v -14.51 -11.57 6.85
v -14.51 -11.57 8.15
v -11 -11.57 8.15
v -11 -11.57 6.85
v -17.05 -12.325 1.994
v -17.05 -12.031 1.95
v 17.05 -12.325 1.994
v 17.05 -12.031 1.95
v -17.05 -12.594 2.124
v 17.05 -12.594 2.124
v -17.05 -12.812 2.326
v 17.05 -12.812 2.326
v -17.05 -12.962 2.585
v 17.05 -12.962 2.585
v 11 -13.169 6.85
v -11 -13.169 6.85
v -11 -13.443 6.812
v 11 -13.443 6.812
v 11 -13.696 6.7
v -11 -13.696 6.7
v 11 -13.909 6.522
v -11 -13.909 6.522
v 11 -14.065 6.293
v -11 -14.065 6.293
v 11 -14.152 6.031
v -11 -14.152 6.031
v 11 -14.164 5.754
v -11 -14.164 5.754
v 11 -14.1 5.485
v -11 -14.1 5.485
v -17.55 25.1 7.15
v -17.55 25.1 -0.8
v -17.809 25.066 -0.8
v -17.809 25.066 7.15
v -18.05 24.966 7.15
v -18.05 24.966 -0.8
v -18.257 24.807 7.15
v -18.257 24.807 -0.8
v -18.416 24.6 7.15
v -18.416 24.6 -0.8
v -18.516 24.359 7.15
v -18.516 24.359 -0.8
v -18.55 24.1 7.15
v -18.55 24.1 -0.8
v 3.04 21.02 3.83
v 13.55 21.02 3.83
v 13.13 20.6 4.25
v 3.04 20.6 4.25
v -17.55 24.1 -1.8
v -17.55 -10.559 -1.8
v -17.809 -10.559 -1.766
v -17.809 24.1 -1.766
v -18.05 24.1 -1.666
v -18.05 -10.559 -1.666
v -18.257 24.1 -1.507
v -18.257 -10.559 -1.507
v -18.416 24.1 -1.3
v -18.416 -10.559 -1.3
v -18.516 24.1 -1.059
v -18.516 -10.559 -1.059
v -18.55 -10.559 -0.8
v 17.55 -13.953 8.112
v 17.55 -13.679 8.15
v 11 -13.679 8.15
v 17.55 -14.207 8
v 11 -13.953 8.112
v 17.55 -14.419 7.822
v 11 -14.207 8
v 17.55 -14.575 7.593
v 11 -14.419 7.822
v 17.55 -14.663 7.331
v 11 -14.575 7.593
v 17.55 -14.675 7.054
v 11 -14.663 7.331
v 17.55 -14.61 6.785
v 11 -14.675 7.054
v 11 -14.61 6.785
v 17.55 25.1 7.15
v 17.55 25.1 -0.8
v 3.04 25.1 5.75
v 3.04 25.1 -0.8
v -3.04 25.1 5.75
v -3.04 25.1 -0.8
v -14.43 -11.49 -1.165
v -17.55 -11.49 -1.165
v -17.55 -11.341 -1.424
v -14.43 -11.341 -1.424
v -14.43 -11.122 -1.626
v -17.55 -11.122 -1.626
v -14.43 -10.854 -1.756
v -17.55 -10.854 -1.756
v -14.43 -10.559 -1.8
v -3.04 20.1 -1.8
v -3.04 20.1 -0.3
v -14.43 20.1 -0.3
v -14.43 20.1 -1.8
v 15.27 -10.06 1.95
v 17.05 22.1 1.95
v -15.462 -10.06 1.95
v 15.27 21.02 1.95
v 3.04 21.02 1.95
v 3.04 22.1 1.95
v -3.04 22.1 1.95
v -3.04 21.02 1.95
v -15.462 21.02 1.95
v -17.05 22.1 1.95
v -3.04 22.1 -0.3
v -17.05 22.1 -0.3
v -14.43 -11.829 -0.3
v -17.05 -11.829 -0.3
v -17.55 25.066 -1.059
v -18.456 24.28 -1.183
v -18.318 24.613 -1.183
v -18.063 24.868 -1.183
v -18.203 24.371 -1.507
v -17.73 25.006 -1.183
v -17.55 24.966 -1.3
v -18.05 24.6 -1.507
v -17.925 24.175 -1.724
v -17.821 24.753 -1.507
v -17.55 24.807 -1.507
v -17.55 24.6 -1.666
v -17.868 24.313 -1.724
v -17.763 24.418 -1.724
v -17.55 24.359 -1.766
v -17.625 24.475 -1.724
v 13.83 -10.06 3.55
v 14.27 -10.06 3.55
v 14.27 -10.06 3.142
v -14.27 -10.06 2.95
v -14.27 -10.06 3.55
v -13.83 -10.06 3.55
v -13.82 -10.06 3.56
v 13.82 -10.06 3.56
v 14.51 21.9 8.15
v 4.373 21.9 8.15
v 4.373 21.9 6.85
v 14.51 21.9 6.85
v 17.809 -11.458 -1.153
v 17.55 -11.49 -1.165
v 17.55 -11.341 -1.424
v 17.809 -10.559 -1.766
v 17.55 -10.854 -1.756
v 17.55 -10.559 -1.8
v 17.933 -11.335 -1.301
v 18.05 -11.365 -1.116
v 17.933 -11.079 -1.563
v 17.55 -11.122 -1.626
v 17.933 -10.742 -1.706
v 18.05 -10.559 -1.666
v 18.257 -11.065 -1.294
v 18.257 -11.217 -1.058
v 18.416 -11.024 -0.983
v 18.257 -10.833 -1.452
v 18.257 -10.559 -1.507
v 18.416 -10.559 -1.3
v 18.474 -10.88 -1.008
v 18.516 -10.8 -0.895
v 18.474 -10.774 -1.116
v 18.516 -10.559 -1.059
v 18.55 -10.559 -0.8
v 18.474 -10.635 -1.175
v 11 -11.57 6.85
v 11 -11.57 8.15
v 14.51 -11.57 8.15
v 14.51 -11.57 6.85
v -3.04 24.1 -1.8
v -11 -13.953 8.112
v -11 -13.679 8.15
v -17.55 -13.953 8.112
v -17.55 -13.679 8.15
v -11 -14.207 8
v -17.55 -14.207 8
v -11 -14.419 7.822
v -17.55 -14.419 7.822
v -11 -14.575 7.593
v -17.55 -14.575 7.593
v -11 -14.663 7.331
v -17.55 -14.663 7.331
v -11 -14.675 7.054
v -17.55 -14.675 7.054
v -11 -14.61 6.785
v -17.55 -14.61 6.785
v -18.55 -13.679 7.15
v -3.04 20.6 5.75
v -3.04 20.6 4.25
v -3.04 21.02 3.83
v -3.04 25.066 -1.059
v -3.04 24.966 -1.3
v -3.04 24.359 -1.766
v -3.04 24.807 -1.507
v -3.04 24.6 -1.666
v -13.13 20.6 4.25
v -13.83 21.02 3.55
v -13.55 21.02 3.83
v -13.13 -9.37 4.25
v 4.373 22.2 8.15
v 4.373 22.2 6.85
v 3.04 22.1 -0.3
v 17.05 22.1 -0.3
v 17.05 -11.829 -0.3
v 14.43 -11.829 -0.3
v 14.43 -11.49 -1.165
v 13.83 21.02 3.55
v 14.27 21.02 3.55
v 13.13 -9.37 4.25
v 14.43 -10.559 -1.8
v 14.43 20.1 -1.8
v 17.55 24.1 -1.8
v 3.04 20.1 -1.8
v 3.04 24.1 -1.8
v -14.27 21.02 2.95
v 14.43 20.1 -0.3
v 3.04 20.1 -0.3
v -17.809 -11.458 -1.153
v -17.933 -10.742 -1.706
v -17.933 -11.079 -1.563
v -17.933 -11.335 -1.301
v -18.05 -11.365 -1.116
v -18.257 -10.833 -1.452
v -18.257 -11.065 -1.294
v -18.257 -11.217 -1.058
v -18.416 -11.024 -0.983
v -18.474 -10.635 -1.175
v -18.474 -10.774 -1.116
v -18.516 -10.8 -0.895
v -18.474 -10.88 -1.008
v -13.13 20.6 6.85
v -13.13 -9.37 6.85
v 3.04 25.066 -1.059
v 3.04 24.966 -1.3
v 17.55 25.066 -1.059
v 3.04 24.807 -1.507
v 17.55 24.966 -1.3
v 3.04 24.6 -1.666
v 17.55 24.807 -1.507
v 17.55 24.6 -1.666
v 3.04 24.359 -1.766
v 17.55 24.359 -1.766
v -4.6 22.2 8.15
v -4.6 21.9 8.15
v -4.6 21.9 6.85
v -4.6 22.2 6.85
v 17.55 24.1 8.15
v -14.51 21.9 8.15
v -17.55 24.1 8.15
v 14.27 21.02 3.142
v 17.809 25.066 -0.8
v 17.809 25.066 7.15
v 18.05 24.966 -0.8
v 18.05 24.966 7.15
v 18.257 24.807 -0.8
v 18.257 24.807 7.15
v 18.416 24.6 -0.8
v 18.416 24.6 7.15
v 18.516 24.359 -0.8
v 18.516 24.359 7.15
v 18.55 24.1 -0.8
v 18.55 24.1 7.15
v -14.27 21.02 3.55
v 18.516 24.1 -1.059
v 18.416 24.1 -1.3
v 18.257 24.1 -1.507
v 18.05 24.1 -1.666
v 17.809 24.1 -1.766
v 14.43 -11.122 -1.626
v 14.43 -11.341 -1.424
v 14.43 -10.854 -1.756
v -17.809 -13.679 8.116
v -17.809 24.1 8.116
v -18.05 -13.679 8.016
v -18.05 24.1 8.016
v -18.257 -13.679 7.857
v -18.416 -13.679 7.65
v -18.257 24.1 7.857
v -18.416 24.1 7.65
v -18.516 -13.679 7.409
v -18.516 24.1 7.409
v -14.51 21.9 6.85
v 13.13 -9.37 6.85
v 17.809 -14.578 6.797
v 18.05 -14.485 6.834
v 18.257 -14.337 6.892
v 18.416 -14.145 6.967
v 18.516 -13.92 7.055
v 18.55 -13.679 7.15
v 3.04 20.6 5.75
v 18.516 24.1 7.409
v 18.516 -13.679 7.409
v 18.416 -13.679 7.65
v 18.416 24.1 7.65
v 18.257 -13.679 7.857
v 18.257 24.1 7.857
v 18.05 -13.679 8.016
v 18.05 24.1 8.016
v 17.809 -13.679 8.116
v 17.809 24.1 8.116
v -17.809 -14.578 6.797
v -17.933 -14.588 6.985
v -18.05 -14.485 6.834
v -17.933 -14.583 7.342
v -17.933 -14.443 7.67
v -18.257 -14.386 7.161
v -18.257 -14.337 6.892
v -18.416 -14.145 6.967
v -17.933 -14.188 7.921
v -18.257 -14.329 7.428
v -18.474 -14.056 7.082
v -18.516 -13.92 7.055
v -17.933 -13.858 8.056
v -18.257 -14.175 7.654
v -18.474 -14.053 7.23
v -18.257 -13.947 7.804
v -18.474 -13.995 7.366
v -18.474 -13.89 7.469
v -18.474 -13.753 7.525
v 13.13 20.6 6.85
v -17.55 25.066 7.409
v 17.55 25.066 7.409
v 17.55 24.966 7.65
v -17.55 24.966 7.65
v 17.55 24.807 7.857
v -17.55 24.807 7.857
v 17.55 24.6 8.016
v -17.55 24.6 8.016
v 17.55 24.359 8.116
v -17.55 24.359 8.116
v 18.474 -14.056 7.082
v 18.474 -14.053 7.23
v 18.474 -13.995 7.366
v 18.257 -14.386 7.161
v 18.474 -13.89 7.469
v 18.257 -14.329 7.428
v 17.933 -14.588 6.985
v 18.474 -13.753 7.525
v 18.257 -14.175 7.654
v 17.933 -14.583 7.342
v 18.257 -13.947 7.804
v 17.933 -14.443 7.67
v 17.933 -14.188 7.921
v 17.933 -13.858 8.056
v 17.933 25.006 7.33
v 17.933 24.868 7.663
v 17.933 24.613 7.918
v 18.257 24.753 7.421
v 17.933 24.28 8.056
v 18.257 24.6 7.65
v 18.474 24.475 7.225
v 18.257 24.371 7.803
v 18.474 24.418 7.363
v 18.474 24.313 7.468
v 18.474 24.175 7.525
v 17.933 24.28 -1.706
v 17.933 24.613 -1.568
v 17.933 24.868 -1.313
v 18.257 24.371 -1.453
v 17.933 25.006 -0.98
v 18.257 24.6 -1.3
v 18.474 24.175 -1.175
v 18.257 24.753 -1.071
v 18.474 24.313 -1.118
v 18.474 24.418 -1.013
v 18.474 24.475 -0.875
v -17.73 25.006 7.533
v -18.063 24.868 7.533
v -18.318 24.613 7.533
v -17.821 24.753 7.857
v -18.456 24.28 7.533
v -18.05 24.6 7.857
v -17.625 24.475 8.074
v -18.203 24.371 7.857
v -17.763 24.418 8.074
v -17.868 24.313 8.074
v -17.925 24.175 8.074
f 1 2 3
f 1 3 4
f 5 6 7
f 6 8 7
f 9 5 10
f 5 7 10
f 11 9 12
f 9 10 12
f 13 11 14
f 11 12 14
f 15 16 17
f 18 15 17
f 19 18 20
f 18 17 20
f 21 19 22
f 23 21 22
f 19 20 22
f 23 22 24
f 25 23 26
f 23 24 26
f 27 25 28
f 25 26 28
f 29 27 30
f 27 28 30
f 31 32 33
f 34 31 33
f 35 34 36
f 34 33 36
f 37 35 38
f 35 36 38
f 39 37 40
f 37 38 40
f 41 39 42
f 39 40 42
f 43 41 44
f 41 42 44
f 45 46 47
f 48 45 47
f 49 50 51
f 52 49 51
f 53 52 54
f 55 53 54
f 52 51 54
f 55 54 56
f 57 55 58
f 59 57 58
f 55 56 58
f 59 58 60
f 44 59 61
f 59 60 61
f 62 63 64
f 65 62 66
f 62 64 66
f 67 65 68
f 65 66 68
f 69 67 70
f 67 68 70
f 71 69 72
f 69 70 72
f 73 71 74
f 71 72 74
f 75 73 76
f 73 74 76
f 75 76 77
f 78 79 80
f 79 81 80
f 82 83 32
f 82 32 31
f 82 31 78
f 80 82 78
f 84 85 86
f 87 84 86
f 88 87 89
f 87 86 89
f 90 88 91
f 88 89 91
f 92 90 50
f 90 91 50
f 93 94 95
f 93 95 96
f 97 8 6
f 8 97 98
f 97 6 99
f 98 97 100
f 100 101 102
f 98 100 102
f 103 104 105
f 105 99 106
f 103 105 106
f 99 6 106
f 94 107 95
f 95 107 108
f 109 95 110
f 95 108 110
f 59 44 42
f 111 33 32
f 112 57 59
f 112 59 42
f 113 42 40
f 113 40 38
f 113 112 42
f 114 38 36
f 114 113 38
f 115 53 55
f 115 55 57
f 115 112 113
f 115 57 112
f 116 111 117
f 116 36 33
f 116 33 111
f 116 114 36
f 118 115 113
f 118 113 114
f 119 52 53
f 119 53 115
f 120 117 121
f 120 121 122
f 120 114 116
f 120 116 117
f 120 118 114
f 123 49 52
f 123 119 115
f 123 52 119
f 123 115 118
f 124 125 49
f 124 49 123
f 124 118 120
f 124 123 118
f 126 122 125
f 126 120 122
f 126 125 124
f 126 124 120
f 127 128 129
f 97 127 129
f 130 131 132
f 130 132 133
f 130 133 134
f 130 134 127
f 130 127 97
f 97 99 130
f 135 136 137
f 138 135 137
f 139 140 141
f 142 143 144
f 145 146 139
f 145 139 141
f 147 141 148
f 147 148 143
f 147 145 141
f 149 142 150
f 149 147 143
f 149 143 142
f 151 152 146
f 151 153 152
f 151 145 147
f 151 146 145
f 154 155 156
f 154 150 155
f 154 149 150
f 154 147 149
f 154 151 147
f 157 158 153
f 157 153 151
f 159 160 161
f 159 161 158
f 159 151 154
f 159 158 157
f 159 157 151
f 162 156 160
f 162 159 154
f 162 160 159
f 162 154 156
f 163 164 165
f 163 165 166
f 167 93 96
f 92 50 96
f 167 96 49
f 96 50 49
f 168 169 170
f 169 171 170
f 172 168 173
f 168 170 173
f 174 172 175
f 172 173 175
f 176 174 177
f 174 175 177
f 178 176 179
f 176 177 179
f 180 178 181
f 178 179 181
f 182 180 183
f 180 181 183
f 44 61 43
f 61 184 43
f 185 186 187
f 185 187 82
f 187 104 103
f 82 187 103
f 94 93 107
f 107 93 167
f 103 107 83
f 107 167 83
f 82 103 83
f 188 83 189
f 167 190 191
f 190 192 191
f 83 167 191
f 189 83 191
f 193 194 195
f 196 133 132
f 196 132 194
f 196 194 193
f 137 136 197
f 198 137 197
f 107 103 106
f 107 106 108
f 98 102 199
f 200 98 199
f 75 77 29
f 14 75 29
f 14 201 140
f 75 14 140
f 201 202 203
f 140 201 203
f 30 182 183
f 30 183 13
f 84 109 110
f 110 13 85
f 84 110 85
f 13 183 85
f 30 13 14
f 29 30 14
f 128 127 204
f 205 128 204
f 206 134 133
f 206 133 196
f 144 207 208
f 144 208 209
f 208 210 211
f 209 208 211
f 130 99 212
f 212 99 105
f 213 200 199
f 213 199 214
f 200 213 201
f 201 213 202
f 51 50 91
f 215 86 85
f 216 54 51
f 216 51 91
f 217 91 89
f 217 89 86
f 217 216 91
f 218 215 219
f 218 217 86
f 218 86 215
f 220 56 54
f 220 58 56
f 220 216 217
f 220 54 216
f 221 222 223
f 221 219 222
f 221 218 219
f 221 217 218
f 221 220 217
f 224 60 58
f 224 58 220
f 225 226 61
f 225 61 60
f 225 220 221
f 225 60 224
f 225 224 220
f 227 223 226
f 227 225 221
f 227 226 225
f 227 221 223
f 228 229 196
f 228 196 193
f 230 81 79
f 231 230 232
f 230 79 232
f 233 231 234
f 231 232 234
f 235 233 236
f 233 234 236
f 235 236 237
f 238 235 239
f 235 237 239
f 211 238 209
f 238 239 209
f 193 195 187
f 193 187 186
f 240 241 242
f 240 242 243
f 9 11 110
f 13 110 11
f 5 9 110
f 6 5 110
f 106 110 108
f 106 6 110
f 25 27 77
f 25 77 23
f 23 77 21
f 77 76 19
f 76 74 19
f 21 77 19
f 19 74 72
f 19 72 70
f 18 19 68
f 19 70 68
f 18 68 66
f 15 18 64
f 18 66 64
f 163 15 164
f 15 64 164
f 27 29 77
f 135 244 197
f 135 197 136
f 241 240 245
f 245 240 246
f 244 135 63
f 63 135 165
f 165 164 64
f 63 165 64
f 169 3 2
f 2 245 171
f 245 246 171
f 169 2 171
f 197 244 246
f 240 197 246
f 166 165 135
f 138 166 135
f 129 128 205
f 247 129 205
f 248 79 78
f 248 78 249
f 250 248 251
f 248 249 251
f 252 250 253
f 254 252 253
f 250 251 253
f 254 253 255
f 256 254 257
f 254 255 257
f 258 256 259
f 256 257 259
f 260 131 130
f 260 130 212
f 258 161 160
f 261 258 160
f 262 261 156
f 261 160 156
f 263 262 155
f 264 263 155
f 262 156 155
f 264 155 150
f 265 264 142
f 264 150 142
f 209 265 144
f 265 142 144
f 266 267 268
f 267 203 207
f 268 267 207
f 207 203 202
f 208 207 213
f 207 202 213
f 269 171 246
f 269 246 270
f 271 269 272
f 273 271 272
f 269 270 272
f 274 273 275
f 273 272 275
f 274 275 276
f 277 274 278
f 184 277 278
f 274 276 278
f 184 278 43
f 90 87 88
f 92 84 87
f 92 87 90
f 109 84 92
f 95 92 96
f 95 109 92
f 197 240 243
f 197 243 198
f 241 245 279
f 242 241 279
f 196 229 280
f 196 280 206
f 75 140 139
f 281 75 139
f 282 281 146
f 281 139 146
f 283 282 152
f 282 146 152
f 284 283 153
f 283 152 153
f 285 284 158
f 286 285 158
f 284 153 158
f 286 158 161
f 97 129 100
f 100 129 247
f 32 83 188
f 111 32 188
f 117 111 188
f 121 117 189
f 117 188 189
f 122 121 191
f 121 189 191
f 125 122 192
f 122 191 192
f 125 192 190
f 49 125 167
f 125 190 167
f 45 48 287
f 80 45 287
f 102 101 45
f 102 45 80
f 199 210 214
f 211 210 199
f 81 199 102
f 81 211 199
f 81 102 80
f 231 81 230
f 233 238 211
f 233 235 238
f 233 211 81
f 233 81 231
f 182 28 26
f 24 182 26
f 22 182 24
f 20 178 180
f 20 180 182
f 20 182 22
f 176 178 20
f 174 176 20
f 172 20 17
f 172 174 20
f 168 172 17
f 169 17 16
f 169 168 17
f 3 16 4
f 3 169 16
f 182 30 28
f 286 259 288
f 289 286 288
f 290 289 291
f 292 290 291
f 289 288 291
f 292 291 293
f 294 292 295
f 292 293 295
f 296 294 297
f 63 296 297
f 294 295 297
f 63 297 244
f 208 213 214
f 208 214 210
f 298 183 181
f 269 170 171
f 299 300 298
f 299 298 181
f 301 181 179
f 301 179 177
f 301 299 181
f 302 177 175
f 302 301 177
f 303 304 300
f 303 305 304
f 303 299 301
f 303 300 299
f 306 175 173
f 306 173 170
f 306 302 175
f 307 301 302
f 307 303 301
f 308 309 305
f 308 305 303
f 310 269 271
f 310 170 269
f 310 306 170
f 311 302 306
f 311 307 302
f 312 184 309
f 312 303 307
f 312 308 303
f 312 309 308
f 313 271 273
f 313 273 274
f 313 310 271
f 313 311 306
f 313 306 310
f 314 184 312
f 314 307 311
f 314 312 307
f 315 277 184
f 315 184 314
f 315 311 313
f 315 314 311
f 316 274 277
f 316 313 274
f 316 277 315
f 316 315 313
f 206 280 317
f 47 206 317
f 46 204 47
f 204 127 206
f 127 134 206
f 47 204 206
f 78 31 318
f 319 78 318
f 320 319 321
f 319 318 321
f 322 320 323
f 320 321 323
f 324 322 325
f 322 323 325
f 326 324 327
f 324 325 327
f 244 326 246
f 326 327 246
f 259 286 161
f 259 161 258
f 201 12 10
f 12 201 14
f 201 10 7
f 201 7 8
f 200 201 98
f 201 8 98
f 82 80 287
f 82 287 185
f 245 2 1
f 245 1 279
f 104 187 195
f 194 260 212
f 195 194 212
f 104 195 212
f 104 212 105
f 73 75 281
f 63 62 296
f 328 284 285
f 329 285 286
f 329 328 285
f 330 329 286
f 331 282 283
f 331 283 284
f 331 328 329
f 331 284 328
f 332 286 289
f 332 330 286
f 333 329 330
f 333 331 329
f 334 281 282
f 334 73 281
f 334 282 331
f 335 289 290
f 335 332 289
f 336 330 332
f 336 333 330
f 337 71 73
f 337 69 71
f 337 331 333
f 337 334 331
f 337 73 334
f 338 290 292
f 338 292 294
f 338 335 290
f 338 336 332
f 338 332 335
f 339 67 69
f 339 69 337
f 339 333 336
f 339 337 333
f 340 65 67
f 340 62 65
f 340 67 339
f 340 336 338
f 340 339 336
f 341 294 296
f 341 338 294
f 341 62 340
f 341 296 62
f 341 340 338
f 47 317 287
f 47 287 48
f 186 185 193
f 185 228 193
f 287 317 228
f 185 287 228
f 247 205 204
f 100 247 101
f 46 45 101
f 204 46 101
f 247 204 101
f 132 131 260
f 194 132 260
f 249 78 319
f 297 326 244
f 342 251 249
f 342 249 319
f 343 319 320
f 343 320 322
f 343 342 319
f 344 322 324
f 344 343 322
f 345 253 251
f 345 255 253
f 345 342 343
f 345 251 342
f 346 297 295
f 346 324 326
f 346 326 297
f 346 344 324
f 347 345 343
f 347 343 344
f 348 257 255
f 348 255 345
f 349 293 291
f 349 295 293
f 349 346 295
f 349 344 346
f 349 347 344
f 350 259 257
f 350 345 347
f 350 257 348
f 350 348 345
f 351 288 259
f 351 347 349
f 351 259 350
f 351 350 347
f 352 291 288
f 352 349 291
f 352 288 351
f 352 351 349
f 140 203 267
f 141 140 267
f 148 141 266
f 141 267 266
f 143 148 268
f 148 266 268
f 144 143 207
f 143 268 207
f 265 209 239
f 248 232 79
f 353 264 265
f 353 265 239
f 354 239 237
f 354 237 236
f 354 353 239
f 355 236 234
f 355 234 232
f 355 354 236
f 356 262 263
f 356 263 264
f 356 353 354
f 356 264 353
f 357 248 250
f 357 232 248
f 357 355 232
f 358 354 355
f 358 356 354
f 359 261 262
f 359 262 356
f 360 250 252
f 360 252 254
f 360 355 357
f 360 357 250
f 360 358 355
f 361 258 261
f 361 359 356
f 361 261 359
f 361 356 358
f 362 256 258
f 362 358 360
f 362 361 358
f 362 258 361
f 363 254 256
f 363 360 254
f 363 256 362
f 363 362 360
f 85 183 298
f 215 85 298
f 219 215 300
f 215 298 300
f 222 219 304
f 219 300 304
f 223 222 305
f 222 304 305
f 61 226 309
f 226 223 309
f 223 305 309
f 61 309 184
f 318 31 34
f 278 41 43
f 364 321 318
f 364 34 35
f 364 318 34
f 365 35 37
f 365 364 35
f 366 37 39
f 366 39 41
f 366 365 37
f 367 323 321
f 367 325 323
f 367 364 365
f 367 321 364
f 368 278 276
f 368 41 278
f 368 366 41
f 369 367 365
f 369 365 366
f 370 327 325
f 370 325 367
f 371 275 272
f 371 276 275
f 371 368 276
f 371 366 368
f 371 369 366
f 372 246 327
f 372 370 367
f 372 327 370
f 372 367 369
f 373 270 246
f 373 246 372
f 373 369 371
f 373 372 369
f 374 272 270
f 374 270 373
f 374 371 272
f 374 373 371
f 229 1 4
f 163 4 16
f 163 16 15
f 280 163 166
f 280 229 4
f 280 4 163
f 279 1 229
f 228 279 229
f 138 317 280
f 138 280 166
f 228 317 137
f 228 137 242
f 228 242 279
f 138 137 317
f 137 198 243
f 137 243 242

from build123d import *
from OCP.BRepFilletAPI import BRepFilletAPI_MakeChamfer

# Parameters (mm, degrees)
BOSS_EXTRUDE1_START    = -18.55
BOSS_EXTRUDE1_DEPTH    = 4.04
BOSS_EXTRUDE1_START_2  = -14.51
BOSS_EXTRUDE1_2_DEPTH  = 1.38
BOSS_EXTRUDE1_3_DEPTH  = 1.5
BOSS_EXTRUDE1_4_DEPTH  = 0.24
BOSS_EXTRUDE1_5_DEPTH  = 0.08
BOSS_EXTRUDE1_START_3  = 14.51
BOSS_EXTRUDE1_6_DEPTH  = 4.04
BOSS_EXTRUDE1_START_4  = 13.13
BOSS_EXTRUDE1_7_DEPTH  = 1.38
BOSS_EXTRUDE1_START_5  = 17.05
BOSS_EXTRUDE1_8_DEPTH  = 1.5
BOSS_EXTRUDE1_START_6  = 14.27
BOSS_EXTRUDE1_9_DEPTH  = 0.24
BOSS_EXTRUDE1_START_7  = 14.43
BOSS_EXTRUDE1_10_DEPTH = 0.08
BOSS_EXTRUDE2_START    = -17.05
BOSS_EXTRUDE2_DEPTH    = 34.1
FILLET1_R              = 1
SKETCH5_W              = 22
SKETCH5_H              = 3.109151444
SKETCH5_W_2            = 8.973474185
SKETCH5_H_2            = 2.258096186
CUT_EXTRUDE1_DEPTH     = 1.3
CHAMFER1_SIZE          = 0.7
FILLET2_R              = 1
SKETCH6_W              = 6.08
SKETCH6_H              = 25.074252642
CUT_EXTRUDE2_DEPTH     = 7.55
CHAMFER3_SIZE          = 1
CHAMFER3_SIZE2         = 1.191753593


with BuildPart() as part:
    # Boss-Extrude1: read off the stored shape, not the designer's step
    # Boss-Extrude1 outline → Boss-Extrude1 (new body)
    with BuildSketch(Plane.YZ.offset(BOSS_EXTRUDE1_START)):
        Polygon((-11.240546545, -1.8), (25.1, -1.8), (25.1, -0.3), (-11.829296545, -0.3), align=None)
        Polygon((-12.712421545, 1.95), (25.1, 1.95), (25.1, 8.15), (-15.145921545, 8.15), align=None)
    extrude(amount=BOSS_EXTRUDE1_DEPTH)

    # Boss-Extrude1 2 outline → Boss-Extrude1 2 (add)
    with BuildSketch(Plane.YZ.offset(BOSS_EXTRUDE1_START_2)):
        Polygon((-13.340421545, 3.55), (25.1, 3.55), (25.1, 6.85), (-14.635671545, 6.85), align=None)
    extrude(amount=BOSS_EXTRUDE1_2_DEPTH)

    # Boss-Extrude1 3 outline → Boss-Extrude1 3 (add)
    with BuildSketch(Plane.YZ.offset(BOSS_EXTRUDE1_START)):
        Polygon((-11.829296545, -0.3), (25.1, -0.3), (25.1, 1.95), (-12.712421545, 1.95), align=None)
    extrude(amount=BOSS_EXTRUDE1_3_DEPTH)

    # Boss-Extrude1 4 outline → Boss-Extrude1 4 (add)
    with BuildSketch(Plane.YZ.offset(BOSS_EXTRUDE1_START_2)):
        Polygon((-12.712421545, 1.95), (25.1, 1.95), (25.1, 3.55), (-13.340421545, 3.55), align=None)
    extrude(amount=BOSS_EXTRUDE1_4_DEPTH)

    # Boss-Extrude1 5 outline → Boss-Extrude1 5 (add)
    with BuildSketch(Plane.YZ.offset(BOSS_EXTRUDE1_START_2)):
        Polygon((-11.240546545, -1.8), (25.1, -1.8), (25.1, -0.3), (-11.829296545, -0.3), align=None)
    extrude(amount=BOSS_EXTRUDE1_5_DEPTH)



with BuildPart() as body_2:
    # Boss-Extrude1 6 outline → Boss-Extrude1 6 (new body)
    with BuildSketch(Plane.YZ.offset(BOSS_EXTRUDE1_START_3)):
        Polygon((-11.240546545, -1.8), (25.1, -1.8), (25.1, -0.3), (-11.829296545, -0.3), align=None)
        Polygon((-12.712421545, 1.95), (25.1, 1.95), (25.1, 8.15), (-15.145921545, 8.15), align=None)
    extrude(amount=BOSS_EXTRUDE1_6_DEPTH)

    # Boss-Extrude1 7 outline → Boss-Extrude1 7 (add)
    with BuildSketch(Plane.YZ.offset(BOSS_EXTRUDE1_START_4)):
        Polygon((-13.340421545, 3.55), (25.1, 3.55), (25.1, 6.85), (-14.635671545, 6.85), align=None)
    extrude(amount=BOSS_EXTRUDE1_7_DEPTH)

    # Boss-Extrude1 8 outline → Boss-Extrude1 8 (add)
    with BuildSketch(Plane.YZ.offset(BOSS_EXTRUDE1_START_5)):
        Polygon((-11.829296545, -0.3), (25.1, -0.3), (25.1, 1.95), (-12.712421545, 1.95), align=None)
    extrude(amount=BOSS_EXTRUDE1_8_DEPTH)

    # Boss-Extrude1 9 outline → Boss-Extrude1 9 (add)
    with BuildSketch(Plane.YZ.offset(BOSS_EXTRUDE1_START_6)):
        Polygon((-12.712421545, 1.95), (25.1, 1.95), (25.1, 3.55), (-13.340421545, 3.55), align=None)
    extrude(amount=BOSS_EXTRUDE1_9_DEPTH)

    # Boss-Extrude1 10 outline → Boss-Extrude1 10 (add)
    with BuildSketch(Plane.YZ.offset(BOSS_EXTRUDE1_START_7)):
        Polygon((-11.240546545, -1.8), (25.1, -1.8), (25.1, -0.3), (-11.829296545, -0.3), align=None)
    extrude(amount=BOSS_EXTRUDE1_10_DEPTH)


with BuildPart() as part_1:
    add(part.part)

    add(body_2.part)  # Boss-Extrude2 merges body 2
    # Sketch4 → Boss-Extrude2 (add)
    with BuildSketch(Plane(origin=(0, 0, 0), x_dir=(0, 0, -1), z_dir=(1, 0, 0)).offset(BOSS_EXTRUDE2_START)):
        Polygon((1.8, 25.1), (-8.15, 25.1), (-8.15, 21.9), (-6.85, 21.9), (-6.85, 20.6), (-3.55, 20.6), (-3.55, 21.02), (-1.95, 21.02), (-1.95, 22.1), (0.3, 22.1), (0.3, 20.1), (1.8, 20.1), (1.8, 22.1), align=None)
        Polygon((-3.55, -10.06), (-1.95, -10.06), (-1.95, -12.712421545), (-8.15, -15.145921545), (-8.15, -11.57), (-6.85, -11.57), (-6.85, -9.37), (-3.55, -9.37), align=None)
    extrude(amount=BOSS_EXTRUDE2_DEPTH)

    # Fillet1
    fillet1_edges = [part_1.edges().sort_by_distance(p)[0] for p in [
        (0, -12.712421545, 1.95),
        (0, -15.145921545, 8.15),
    ]]
    fillet(fillet1_edges, radius=FILLET1_R)

    # Sketch5 → Cut-Extrude1 (cut)
    with BuildSketch(Plane.XY.offset(8.15)):
        with Locations((0, -13.124575722)):
            Rectangle(SKETCH5_W, SKETCH5_H)
        with Locations((-0.113262908, 21.070951907)):
            Rectangle(SKETCH5_W_2, SKETCH5_H_2)
    extrude(amount=-CUT_EXTRUDE1_DEPTH, mode=Mode.SUBTRACT)

    # Chamfer1
    # the kernel refuses this chamfer: 0.7 mm, written as the material it takes off along each edge
    with BuildSketch(Plane(origin=(-13.13, 20.6, 3.55), x_dir=(0, 1, 0), z_dir=(1, 0, 0))) as chamfer1_piece_1_section:
        Polygon((CHAMFER1_SIZE, 0), (0, CHAMFER1_SIZE), (0, 0), align=None)
    chamfer1_piece_1 = extrude(amount=26.26, mode=Mode.PRIVATE)
    chamfer1_piece_1 = split(chamfer1_piece_1, bisect_by=Plane(origin=(-13.13, 21.02, 3.55), z_dir=(0, -1, 0)), keep=Keep.TOP, mode=Mode.PRIVATE)
    add(chamfer1_piece_1, mode=Mode.SUBTRACT)
    with BuildSketch(Plane(origin=(13.13, -9.37, 3.55), x_dir=(1, 0, 0), z_dir=(0, 1, 0))) as chamfer1_piece_2:
        Polygon((CHAMFER1_SIZE, 0), (0, -CHAMFER1_SIZE), (0, 0), align=None)
    extrude(amount=29.97, mode=Mode.SUBTRACT)
    with BuildSketch(Plane(origin=(-13.13, -9.37, 3.55), x_dir=(0, -1, 0), z_dir=(1, 0, 0))) as chamfer1_piece_3_section:
        Polygon((CHAMFER1_SIZE, 0), (0, -CHAMFER1_SIZE), (0, 0), align=None)
    chamfer1_piece_3 = extrude(amount=26.26, mode=Mode.PRIVATE)
    chamfer1_piece_3 = split(chamfer1_piece_3, bisect_by=Plane(origin=(-13.13, -10.06, 3.55), z_dir=(0, 1, 0)), keep=Keep.TOP, mode=Mode.PRIVATE)
    add(chamfer1_piece_3, mode=Mode.SUBTRACT)
    with BuildSketch(Plane(origin=(-13.13, -9.37, 3.55), x_dir=(-1, 0, 0), z_dir=(0, 1, 0))) as chamfer1_piece_4:
        Polygon((CHAMFER1_SIZE, 0), (0, CHAMFER1_SIZE), (0, 0), align=None)
    extrude(amount=29.97, mode=Mode.SUBTRACT)
    with BuildSketch(Plane(origin=(-14.930178092, 20.6, 3.55), x_dir=(0, 1, 0), z_dir=(1, 0, 0))) as chamfer1_piece_5a_section:
        Polygon((CHAMFER1_SIZE, 0), (0, CHAMFER1_SIZE), (0, 0), align=None)
    chamfer1_piece_5a = extrude(amount=28.060178092, mode=Mode.PRIVATE)
    chamfer1_piece_5a = split(chamfer1_piece_5a, bisect_by=Plane(origin=(-14.27, 20.6, 3.55), z_dir=(1, 0, 0)), keep=Keep.TOP, mode=Mode.PRIVATE)
    chamfer1_piece_5a = split(chamfer1_piece_5a, bisect_by=Plane(origin=(-14.930178092, 21.02, 3.55), z_dir=(0, -1, 0)), keep=Keep.TOP, mode=Mode.PRIVATE)
    chamfer1_piece_5a = split(chamfer1_piece_5a, bisect_by=Plane(origin=(-13.13, 20.6, 3.55), z_dir=(-1, 0, 0)), keep=Keep.TOP, mode=Mode.PRIVATE)
    with BuildSketch(Plane(origin=(-13.13, -9.37, 3.55), x_dir=(-1, 0, 0), z_dir=(0, 1, 0))) as chamfer1_piece_5b_section:
        Polygon((CHAMFER1_SIZE, 0), (0, CHAMFER1_SIZE), (0, 0), align=None)
    chamfer1_piece_5b = extrude(amount=31.770178092, mode=Mode.PRIVATE)
    chamfer1_piece_5b = split(chamfer1_piece_5b, bisect_by=Plane(origin=(-13.13, 21.02, 3.55), z_dir=(0, -1, 0)), keep=Keep.TOP, mode=Mode.PRIVATE)
    chamfer1_piece_5b = split(chamfer1_piece_5b, bisect_by=Plane(origin=(-13.13, 20.6, 3.55), z_dir=(0, 1, 0)), keep=Keep.TOP, mode=Mode.PRIVATE)
    chamfer1_piece_5 = chamfer1_piece_5a & chamfer1_piece_5b
    add(chamfer1_piece_5, mode=Mode.SUBTRACT)
    with BuildSketch(Plane(origin=(-13.13, 20.6, 3.55), x_dir=(0, 1, 0), z_dir=(1, 0, 0))) as chamfer1_piece_6a_section:
        Polygon((CHAMFER1_SIZE, 0), (0, CHAMFER1_SIZE), (0, 0), align=None)
    chamfer1_piece_6a = extrude(amount=28.060178092, mode=Mode.PRIVATE)
    chamfer1_piece_6a = split(chamfer1_piece_6a, bisect_by=Plane(origin=(-13.13, 21.02, 3.55), z_dir=(0, -1, 0)), keep=Keep.TOP, mode=Mode.PRIVATE)
    chamfer1_piece_6a = split(chamfer1_piece_6a, bisect_by=Plane(origin=(14.27, 20.6, 3.55), z_dir=(-1, 0, 0)), keep=Keep.TOP, mode=Mode.PRIVATE)
    chamfer1_piece_6a = split(chamfer1_piece_6a, bisect_by=Plane(origin=(13.13, 20.6, 3.55), z_dir=(1, 0, 0)), keep=Keep.TOP, mode=Mode.PRIVATE)
    with BuildSketch(Plane(origin=(13.13, -9.37, 3.55), x_dir=(1, 0, 0), z_dir=(0, 1, 0))) as chamfer1_piece_6b_section:
        Polygon((CHAMFER1_SIZE, 0), (0, -CHAMFER1_SIZE), (0, 0), align=None)
    chamfer1_piece_6b = extrude(amount=31.770178092, mode=Mode.PRIVATE)
    chamfer1_piece_6b = split(chamfer1_piece_6b, bisect_by=Plane(origin=(13.13, 21.02, 3.55), z_dir=(0, -1, 0)), keep=Keep.TOP, mode=Mode.PRIVATE)
    chamfer1_piece_6b = split(chamfer1_piece_6b, bisect_by=Plane(origin=(13.13, 20.6, 3.55), z_dir=(0, 1, 0)), keep=Keep.TOP, mode=Mode.PRIVATE)
    chamfer1_piece_6 = chamfer1_piece_6a & chamfer1_piece_6b
    add(chamfer1_piece_6, mode=Mode.SUBTRACT)
    with BuildSketch(Plane(origin=(13.13, -11.170178092, 3.55), x_dir=(1, 0, 0), z_dir=(0, 1, 0))) as chamfer1_piece_7a_section:
        Polygon((CHAMFER1_SIZE, 0), (0, -CHAMFER1_SIZE), (0, 0), align=None)
    chamfer1_piece_7a = extrude(amount=31.770178092, mode=Mode.PRIVATE)
    chamfer1_piece_7a = split(chamfer1_piece_7a, bisect_by=Plane(origin=(13.13, -10.06, 3.55), z_dir=(0, 1, 0)), keep=Keep.TOP, mode=Mode.PRIVATE)
    chamfer1_piece_7a = split(chamfer1_piece_7a, bisect_by=Plane(origin=(13.13, -9.37, 3.55), z_dir=(0, -1, 0)), keep=Keep.TOP, mode=Mode.PRIVATE)
    with BuildSketch(Plane(origin=(-13.13, -9.37, 3.55), x_dir=(0, -1, 0), z_dir=(1, 0, 0))) as chamfer1_piece_7b_section:
        Polygon((CHAMFER1_SIZE, 0), (0, -CHAMFER1_SIZE), (0, 0), align=None)
    chamfer1_piece_7b = extrude(amount=28.060178092, mode=Mode.PRIVATE)
    chamfer1_piece_7b = split(chamfer1_piece_7b, bisect_by=Plane(origin=(-13.13, -10.06, 3.55), z_dir=(0, 1, 0)), keep=Keep.TOP, mode=Mode.PRIVATE)
    chamfer1_piece_7b = split(chamfer1_piece_7b, bisect_by=Plane(origin=(14.27, -9.37, 3.55), z_dir=(-1, 0, 0)), keep=Keep.TOP, mode=Mode.PRIVATE)
    chamfer1_piece_7b = split(chamfer1_piece_7b, bisect_by=Plane(origin=(13.13, -9.37, 3.55), z_dir=(1, 0, 0)), keep=Keep.TOP, mode=Mode.PRIVATE)
    chamfer1_piece_7 = chamfer1_piece_7a & chamfer1_piece_7b
    add(chamfer1_piece_7, mode=Mode.SUBTRACT)
    with BuildSketch(Plane(origin=(-14.930178092, -9.37, 3.55), x_dir=(0, -1, 0), z_dir=(1, 0, 0))) as chamfer1_piece_8a_section:
        Polygon((CHAMFER1_SIZE, 0), (0, -CHAMFER1_SIZE), (0, 0), align=None)
    chamfer1_piece_8a = extrude(amount=28.060178092, mode=Mode.PRIVATE)
    chamfer1_piece_8a = split(chamfer1_piece_8a, bisect_by=Plane(origin=(-14.27, -9.37, 3.55), z_dir=(1, 0, 0)), keep=Keep.TOP, mode=Mode.PRIVATE)
    chamfer1_piece_8a = split(chamfer1_piece_8a, bisect_by=Plane(origin=(-14.930178092, -10.06, 3.55), z_dir=(0, 1, 0)), keep=Keep.TOP, mode=Mode.PRIVATE)
    chamfer1_piece_8a = split(chamfer1_piece_8a, bisect_by=Plane(origin=(-13.13, -9.37, 3.55), z_dir=(-1, 0, 0)), keep=Keep.TOP, mode=Mode.PRIVATE)
    with BuildSketch(Plane(origin=(-13.13, -11.170178092, 3.55), x_dir=(-1, 0, 0), z_dir=(0, 1, 0))) as chamfer1_piece_8b_section:
        Polygon((CHAMFER1_SIZE, 0), (0, CHAMFER1_SIZE), (0, 0), align=None)
    chamfer1_piece_8b = extrude(amount=31.770178092, mode=Mode.PRIVATE)
    chamfer1_piece_8b = split(chamfer1_piece_8b, bisect_by=Plane(origin=(-13.13, -10.06, 3.55), z_dir=(0, 1, 0)), keep=Keep.TOP, mode=Mode.PRIVATE)
    chamfer1_piece_8b = split(chamfer1_piece_8b, bisect_by=Plane(origin=(-13.13, -9.37, 3.55), z_dir=(0, -1, 0)), keep=Keep.TOP, mode=Mode.PRIVATE)
    chamfer1_piece_8 = chamfer1_piece_8a & chamfer1_piece_8b
    add(chamfer1_piece_8, mode=Mode.SUBTRACT)

    # Fillet2
    # the kernel refuses this fillet: 1 mm, written as the material it takes off along each edge
    with BuildSketch(Plane(origin=(-17.55, 24.1, 7.15), x_dir=(-1, 0, 0), z_dir=(0, 0, 1))) as fillet2_piece_1_section:
        Polygon((0, 0), (FILLET2_R, 0), (FILLET2_R, -FILLET2_R), (0, -FILLET2_R), align=None)
    fillet2_piece_1 = extrude(amount=FILLET2_R, mode=Mode.PRIVATE)
    fillet2_piece_1 = fillet2_piece_1 - Plane(origin=(-17.55, 24.1, 7.15), x_dir=(0.7071067811865475, -0.7071067811865475, 0), z_dir=(0, 0, 1)) * Sphere(FILLET2_R, mode=Mode.PRIVATE)
    add(fillet2_piece_1, mode=Mode.SUBTRACT)
    with BuildSketch(Plane(origin=(17.55, -10.558776444, -0.8), x_dir=(0, 0, -1), z_dir=(1, 0, 0))) as fillet2_piece_2_section:
        Polygon((0, 0), (FILLET2_R, 0), (FILLET2_R, -FILLET2_R * 0.681770101045), (FILLET2_R * 0.365364352613, -FILLET2_R * 0.930864592645), align=None)
    fillet2_piece_2 = extrude(amount=FILLET2_R, mode=Mode.PRIVATE)
    fillet2_piece_2 = fillet2_piece_2 - Plane(origin=(17.55, -10.558776444, -0.8), x_dir=(0, 0.5633097049523215, 0.8262458328527464), z_dir=(1, 0, 0)) * Sphere(FILLET2_R, mode=Mode.PRIVATE)
    add(fillet2_piece_2, mode=Mode.SUBTRACT)
    with BuildSketch(Plane(origin=(-17.55, -10.558776444, -0.8), x_dir=(0, -0.9308645926447314, -0.36536435261305716), z_dir=(-1, 0, 0))) as fillet2_piece_3_section:
        Polygon((0, 0), (FILLET2_R, 0), (FILLET2_R, -FILLET2_R * 0.681770101045), (FILLET2_R * 0.365364352613, -FILLET2_R * 0.930864592645), align=None)
    fillet2_piece_3 = extrude(amount=FILLET2_R, mode=Mode.PRIVATE)
    fillet2_piece_3 = fillet2_piece_3 - Plane(origin=(-17.55, -10.558776444, -0.8), x_dir=(0, 0.5633097049523215, 0.8262458328527464), z_dir=(-1, 0, 0)) * Sphere(FILLET2_R, mode=Mode.PRIVATE)
    add(fillet2_piece_3, mode=Mode.SUBTRACT)
    with BuildSketch(Plane(origin=(17.55, 24.1, 7.15), x_dir=(0, 0, 1), z_dir=(1, 0, 0))) as fillet2_piece_4_section:
        Polygon((0, 0), (FILLET2_R, 0), (FILLET2_R, -FILLET2_R), (0, -FILLET2_R), align=None)
    fillet2_piece_4 = extrude(amount=FILLET2_R, mode=Mode.PRIVATE)
    fillet2_piece_4 = fillet2_piece_4 - Plane(origin=(17.55, 24.1, 7.15), x_dir=(0, -0.7071067811865475, -0.7071067811865475), z_dir=(1, 0, 0)) * Sphere(FILLET2_R, mode=Mode.PRIVATE)
    add(fillet2_piece_4, mode=Mode.SUBTRACT)
    with BuildSketch(Plane(origin=(17.55, 24.1, -0.8), x_dir=(0, 0, -1), z_dir=(1, 0, 0))) as fillet2_piece_5_section:
        Polygon((0, 0), (FILLET2_R, 0), (FILLET2_R, FILLET2_R), (0, FILLET2_R), align=None)
    fillet2_piece_5 = extrude(amount=FILLET2_R, mode=Mode.PRIVATE)
    fillet2_piece_5 = fillet2_piece_5 - Plane(origin=(17.55, 24.1, -0.8), x_dir=(0, -0.7071067811865475, 0.7071067811865475), z_dir=(1, 0, 0)) * Sphere(FILLET2_R, mode=Mode.PRIVATE)
    add(fillet2_piece_5, mode=Mode.SUBTRACT)
    with BuildSketch(Plane(origin=(-17.55, 24.1, -0.8), x_dir=(-1, 0, 0), z_dir=(0, 0, -1))) as fillet2_piece_6_section:
        Polygon((0, 0), (FILLET2_R, 0), (FILLET2_R, FILLET2_R), (0, FILLET2_R), align=None)
    fillet2_piece_6 = extrude(amount=FILLET2_R, mode=Mode.PRIVATE)
    fillet2_piece_6 = fillet2_piece_6 - Plane(origin=(-17.55, 24.1, -0.8), x_dir=(0.7071067811865475, -0.7071067811865475, 0), z_dir=(0, 0, -1)) * Sphere(FILLET2_R, mode=Mode.PRIVATE)
    add(fillet2_piece_6, mode=Mode.SUBTRACT)
    with BuildSketch(Plane(origin=(-18.55, 24.1, 8.15), x_dir=(0, 0, -1), z_dir=(0, -1, 0))) as fillet2_piece_7:
        with BuildLine():
            CenterArc((FILLET2_R, FILLET2_R), FILLET2_R, 180, 90)
            Line((0, FILLET2_R), (0, 0))
            Line((0, 0), (FILLET2_R, 0))
        make_face()
    extrude(amount=37.779151444, mode=Mode.SUBTRACT)
    with BuildSketch(Plane(origin=(18.55, -11.489641037, -1.165364353), x_dir=(0, 0.9308645926447314, 0.36536435261305694), z_dir=(0, -0.365364352613057, 0.9308645926447315)), Plane(origin=(-18.55, -14.610016037, 6.784635647), x_dir=(0, 0.9308645926447315, 0.365364352613057), z_dir=(0, 0.365364352613057, -0.9308645926447315))) as fillet2_piece_8:
        with BuildLine():
            CenterArc((FILLET2_R, FILLET2_R), FILLET2_R, 180, 90)
            Line((0, FILLET2_R), (0, 0))
            Line((0, 0), (FILLET2_R, 0))
        make_face()
    extrude(amount=8.540447303, mode=Mode.SUBTRACT)
    with BuildSketch(Plane(origin=(12.725574747, -11.240546545, -1.8), x_dir=(0, 1, 0), z_dir=(1, 0, 0)), Plane(origin=(-17.55, -11.240546545, -1.8), x_dir=(0, 1, 0), z_dir=(1, 0, 0))) as fillet2_piece_9:
        with BuildLine():
            CenterArc((FILLET2_R * 0.681770101045, FILLET2_R), FILLET2_R, 201.430007302, 68.569992698)
            Line((-FILLET2_R * 0.249094491599, FILLET2_R * 0.634635647387), (0, 0))
            Line((0, 0), (FILLET2_R * 0.681770101045, 0))
        make_face()
    extrude(amount=4.824425253, mode=Mode.SUBTRACT)
    with BuildSketch(Plane(origin=(-18.55, -13.679151444, 7.15), x_dir=(0, -0.930864592644731, -0.3653643526130583), z_dir=(0, 0.3653643526130583, -0.930864592644731))) as fillet2_piece_10:
        with BuildLine():
            CenterArc((1 - FILLET2_R, -FILLET2_R), FILLET2_R, 0, 90)
            Line((1, -FILLET2_R), (1, 0))
            Line((1, 0), (1 - FILLET2_R, 0))
        make_face()
    revolve(axis=Axis((-18.55, -13.679151444, 7.15), (-1, 0, 0)), revolution_arc=111.430007302, mode=Mode.SUBTRACT)
    with BuildSketch(Plane(origin=(18.55, 24.1, 8.15), x_dir=(0, 0, -1), z_dir=(0, -1, 0))) as fillet2_piece_11:
        with BuildLine():
            CenterArc((FILLET2_R, -FILLET2_R), FILLET2_R, 90, 90)
            Line((0, -FILLET2_R), (0, 0))
            Line((0, 0), (FILLET2_R, 0))
        make_face()
    extrude(amount=37.779151444, mode=Mode.SUBTRACT)
    with BuildSketch(Plane(origin=(18.55, -13.679151444, 7.15), x_dir=(0, -0.9308645926447313, -0.3653643526130575), z_dir=(0, 0.3653643526130575, -0.9308645926447313))) as fillet2_piece_12:
        with BuildLine():
            CenterArc((1 - FILLET2_R, FILLET2_R), FILLET2_R, 270, 90)
            Line((1, FILLET2_R), (1, 0))
            Line((1, 0), (1 - FILLET2_R, 0))
        make_face()
    revolve(axis=Axis((18.55, -13.679151444, 7.15), (-1, 0, 0)), revolution_arc=111.430007302, mode=Mode.SUBTRACT)
    with BuildSketch(Plane(origin=(-11, -14.633090645, 6.85), x_dir=(0, 1, 0), z_dir=(1, 0, 0))) as fillet2_piece_13:
        with BuildLine():
            CenterArc((1.464189201, -1), FILLET2_R, 90, 111.430007302)
            Line((0.533324609, -1.365364353), (0.44023815, -1.401900788))
            ThreePointArc((0.44023815, -1.401900788), (-0.07001185, -0.101900788), (-0.09539392, -0.03))
            Line((-0.09539392, -0.03), (0, 0.1))
            Line((0, 0.1), (1.464189201, 0.1))
            Line((1.464189201, 0.1), (1.464189201, 0))
        make_face()
    extrude(amount=22, mode=Mode.SUBTRACT)
    with BuildSketch(Plane(origin=(17.55, 25.1, -1.8), x_dir=(0, -1, 0), z_dir=(-1, 0, 0))) as fillet2_piece_14:
        with BuildLine():
            CenterArc((FILLET2_R, FILLET2_R), FILLET2_R, 180, 90)
            Line((0, FILLET2_R), (0, 0))
            Line((0, 0), (FILLET2_R, 0))
        make_face()
    extrude(amount=35.1, mode=Mode.SUBTRACT)
    with BuildSketch(Plane(origin=(-18.55, 25.1, -0.8), x_dir=(0, -1, 0), z_dir=(0, 0, 1)), Plane(origin=(18.55, 25.1, 7.15), x_dir=(0, -1, 0), z_dir=(0, 0, -1))) as fillet2_piece_15:
        with BuildLine():
            CenterArc((FILLET2_R, FILLET2_R), FILLET2_R, 180, 90)
            Line((0, FILLET2_R), (0, 0))
            Line((0, 0), (FILLET2_R, 0))
        make_face()
    extrude(amount=7.95, mode=Mode.SUBTRACT)
    with BuildSketch(Plane(origin=(-17.55, 25.1, 8.15), x_dir=(0, 0, -1), z_dir=(1, 0, 0))) as fillet2_piece_16:
        with BuildLine():
            CenterArc((FILLET2_R, -FILLET2_R), FILLET2_R, 90, 90)
            Line((0, -FILLET2_R), (0, 0))
            Line((0, 0), (FILLET2_R, 0))
        make_face()
    extrude(amount=35.1, mode=Mode.SUBTRACT)
    with BuildSketch(Plane(origin=(18.55, -10.558776444, -1.8), x_dir=(0, 0, 1), z_dir=(0, 1, 0)), Plane(origin=(-18.55, -10.558776444, -1.8), x_dir=(1, 0, 0), z_dir=(0, 1, 0))) as fillet2_piece_17:
        with BuildLine():
            CenterArc((FILLET2_R, -FILLET2_R), FILLET2_R, 90, 90)
            Line((0, -FILLET2_R), (0, 0))
            Line((0, 0), (FILLET2_R, 0))
        make_face()
    extrude(amount=34.658776444, mode=Mode.SUBTRACT)

    # Sketch6 → Cut-Extrude2 (cut)
    with BuildSketch(Plane(origin=(0, 0, -1.8), x_dir=(-1, 0, 0), z_dir=(0, 0, -1))):
        with Locations((0, 12.562873679)):
            Rectangle(SKETCH6_W, SKETCH6_H)
    extrude(amount=-CUT_EXTRUDE2_DEPTH, mode=Mode.SUBTRACT)

    # Chamfer3: one chamfer whose edges measure the first distance from different faces: ONE call of the kernel's chamfer builder (chamfer() names one face for all edges)
    chamfer3_edges_1 = [part_1.edges().sort_by_distance(p)[0] for p in [
        (14.27, 5.48, 1.95),
    ]]
    chamfer3_side_1 = [part_1.faces().sort_by_distance(p)[0] for p in [
        (-16.567536388, 5.034674278, 1.95),
    ]]
    chamfer3_edges_2 = [part_1.edges().sort_by_distance(p)[0] for p in [
        (-14.27, 5.48, 1.95),
    ]]
    chamfer3_side_2 = [part_1.faces().sort_by_distance(p)[0] for p in [
        (-14.27, 5.48, 2.75),
    ]]
    chamfer3 = BRepFilletAPI_MakeChamfer(part_1.part.solid().wrapped)
    for e in chamfer3_edges_1:
        chamfer3.Add(CHAMFER3_SIZE, CHAMFER3_SIZE2, e.wrapped, chamfer3_side_1[0].wrapped)  # the first distance lies on this face
    for e in chamfer3_edges_2:
        chamfer3.Add(CHAMFER3_SIZE, CHAMFER3_SIZE2, e.wrapped, chamfer3_side_2[0].wrapped)  # the first distance lies on this face
    add(Compound.cast(chamfer3.Shape()), mode=Mode.REPLACE)


solid = part_1.part
